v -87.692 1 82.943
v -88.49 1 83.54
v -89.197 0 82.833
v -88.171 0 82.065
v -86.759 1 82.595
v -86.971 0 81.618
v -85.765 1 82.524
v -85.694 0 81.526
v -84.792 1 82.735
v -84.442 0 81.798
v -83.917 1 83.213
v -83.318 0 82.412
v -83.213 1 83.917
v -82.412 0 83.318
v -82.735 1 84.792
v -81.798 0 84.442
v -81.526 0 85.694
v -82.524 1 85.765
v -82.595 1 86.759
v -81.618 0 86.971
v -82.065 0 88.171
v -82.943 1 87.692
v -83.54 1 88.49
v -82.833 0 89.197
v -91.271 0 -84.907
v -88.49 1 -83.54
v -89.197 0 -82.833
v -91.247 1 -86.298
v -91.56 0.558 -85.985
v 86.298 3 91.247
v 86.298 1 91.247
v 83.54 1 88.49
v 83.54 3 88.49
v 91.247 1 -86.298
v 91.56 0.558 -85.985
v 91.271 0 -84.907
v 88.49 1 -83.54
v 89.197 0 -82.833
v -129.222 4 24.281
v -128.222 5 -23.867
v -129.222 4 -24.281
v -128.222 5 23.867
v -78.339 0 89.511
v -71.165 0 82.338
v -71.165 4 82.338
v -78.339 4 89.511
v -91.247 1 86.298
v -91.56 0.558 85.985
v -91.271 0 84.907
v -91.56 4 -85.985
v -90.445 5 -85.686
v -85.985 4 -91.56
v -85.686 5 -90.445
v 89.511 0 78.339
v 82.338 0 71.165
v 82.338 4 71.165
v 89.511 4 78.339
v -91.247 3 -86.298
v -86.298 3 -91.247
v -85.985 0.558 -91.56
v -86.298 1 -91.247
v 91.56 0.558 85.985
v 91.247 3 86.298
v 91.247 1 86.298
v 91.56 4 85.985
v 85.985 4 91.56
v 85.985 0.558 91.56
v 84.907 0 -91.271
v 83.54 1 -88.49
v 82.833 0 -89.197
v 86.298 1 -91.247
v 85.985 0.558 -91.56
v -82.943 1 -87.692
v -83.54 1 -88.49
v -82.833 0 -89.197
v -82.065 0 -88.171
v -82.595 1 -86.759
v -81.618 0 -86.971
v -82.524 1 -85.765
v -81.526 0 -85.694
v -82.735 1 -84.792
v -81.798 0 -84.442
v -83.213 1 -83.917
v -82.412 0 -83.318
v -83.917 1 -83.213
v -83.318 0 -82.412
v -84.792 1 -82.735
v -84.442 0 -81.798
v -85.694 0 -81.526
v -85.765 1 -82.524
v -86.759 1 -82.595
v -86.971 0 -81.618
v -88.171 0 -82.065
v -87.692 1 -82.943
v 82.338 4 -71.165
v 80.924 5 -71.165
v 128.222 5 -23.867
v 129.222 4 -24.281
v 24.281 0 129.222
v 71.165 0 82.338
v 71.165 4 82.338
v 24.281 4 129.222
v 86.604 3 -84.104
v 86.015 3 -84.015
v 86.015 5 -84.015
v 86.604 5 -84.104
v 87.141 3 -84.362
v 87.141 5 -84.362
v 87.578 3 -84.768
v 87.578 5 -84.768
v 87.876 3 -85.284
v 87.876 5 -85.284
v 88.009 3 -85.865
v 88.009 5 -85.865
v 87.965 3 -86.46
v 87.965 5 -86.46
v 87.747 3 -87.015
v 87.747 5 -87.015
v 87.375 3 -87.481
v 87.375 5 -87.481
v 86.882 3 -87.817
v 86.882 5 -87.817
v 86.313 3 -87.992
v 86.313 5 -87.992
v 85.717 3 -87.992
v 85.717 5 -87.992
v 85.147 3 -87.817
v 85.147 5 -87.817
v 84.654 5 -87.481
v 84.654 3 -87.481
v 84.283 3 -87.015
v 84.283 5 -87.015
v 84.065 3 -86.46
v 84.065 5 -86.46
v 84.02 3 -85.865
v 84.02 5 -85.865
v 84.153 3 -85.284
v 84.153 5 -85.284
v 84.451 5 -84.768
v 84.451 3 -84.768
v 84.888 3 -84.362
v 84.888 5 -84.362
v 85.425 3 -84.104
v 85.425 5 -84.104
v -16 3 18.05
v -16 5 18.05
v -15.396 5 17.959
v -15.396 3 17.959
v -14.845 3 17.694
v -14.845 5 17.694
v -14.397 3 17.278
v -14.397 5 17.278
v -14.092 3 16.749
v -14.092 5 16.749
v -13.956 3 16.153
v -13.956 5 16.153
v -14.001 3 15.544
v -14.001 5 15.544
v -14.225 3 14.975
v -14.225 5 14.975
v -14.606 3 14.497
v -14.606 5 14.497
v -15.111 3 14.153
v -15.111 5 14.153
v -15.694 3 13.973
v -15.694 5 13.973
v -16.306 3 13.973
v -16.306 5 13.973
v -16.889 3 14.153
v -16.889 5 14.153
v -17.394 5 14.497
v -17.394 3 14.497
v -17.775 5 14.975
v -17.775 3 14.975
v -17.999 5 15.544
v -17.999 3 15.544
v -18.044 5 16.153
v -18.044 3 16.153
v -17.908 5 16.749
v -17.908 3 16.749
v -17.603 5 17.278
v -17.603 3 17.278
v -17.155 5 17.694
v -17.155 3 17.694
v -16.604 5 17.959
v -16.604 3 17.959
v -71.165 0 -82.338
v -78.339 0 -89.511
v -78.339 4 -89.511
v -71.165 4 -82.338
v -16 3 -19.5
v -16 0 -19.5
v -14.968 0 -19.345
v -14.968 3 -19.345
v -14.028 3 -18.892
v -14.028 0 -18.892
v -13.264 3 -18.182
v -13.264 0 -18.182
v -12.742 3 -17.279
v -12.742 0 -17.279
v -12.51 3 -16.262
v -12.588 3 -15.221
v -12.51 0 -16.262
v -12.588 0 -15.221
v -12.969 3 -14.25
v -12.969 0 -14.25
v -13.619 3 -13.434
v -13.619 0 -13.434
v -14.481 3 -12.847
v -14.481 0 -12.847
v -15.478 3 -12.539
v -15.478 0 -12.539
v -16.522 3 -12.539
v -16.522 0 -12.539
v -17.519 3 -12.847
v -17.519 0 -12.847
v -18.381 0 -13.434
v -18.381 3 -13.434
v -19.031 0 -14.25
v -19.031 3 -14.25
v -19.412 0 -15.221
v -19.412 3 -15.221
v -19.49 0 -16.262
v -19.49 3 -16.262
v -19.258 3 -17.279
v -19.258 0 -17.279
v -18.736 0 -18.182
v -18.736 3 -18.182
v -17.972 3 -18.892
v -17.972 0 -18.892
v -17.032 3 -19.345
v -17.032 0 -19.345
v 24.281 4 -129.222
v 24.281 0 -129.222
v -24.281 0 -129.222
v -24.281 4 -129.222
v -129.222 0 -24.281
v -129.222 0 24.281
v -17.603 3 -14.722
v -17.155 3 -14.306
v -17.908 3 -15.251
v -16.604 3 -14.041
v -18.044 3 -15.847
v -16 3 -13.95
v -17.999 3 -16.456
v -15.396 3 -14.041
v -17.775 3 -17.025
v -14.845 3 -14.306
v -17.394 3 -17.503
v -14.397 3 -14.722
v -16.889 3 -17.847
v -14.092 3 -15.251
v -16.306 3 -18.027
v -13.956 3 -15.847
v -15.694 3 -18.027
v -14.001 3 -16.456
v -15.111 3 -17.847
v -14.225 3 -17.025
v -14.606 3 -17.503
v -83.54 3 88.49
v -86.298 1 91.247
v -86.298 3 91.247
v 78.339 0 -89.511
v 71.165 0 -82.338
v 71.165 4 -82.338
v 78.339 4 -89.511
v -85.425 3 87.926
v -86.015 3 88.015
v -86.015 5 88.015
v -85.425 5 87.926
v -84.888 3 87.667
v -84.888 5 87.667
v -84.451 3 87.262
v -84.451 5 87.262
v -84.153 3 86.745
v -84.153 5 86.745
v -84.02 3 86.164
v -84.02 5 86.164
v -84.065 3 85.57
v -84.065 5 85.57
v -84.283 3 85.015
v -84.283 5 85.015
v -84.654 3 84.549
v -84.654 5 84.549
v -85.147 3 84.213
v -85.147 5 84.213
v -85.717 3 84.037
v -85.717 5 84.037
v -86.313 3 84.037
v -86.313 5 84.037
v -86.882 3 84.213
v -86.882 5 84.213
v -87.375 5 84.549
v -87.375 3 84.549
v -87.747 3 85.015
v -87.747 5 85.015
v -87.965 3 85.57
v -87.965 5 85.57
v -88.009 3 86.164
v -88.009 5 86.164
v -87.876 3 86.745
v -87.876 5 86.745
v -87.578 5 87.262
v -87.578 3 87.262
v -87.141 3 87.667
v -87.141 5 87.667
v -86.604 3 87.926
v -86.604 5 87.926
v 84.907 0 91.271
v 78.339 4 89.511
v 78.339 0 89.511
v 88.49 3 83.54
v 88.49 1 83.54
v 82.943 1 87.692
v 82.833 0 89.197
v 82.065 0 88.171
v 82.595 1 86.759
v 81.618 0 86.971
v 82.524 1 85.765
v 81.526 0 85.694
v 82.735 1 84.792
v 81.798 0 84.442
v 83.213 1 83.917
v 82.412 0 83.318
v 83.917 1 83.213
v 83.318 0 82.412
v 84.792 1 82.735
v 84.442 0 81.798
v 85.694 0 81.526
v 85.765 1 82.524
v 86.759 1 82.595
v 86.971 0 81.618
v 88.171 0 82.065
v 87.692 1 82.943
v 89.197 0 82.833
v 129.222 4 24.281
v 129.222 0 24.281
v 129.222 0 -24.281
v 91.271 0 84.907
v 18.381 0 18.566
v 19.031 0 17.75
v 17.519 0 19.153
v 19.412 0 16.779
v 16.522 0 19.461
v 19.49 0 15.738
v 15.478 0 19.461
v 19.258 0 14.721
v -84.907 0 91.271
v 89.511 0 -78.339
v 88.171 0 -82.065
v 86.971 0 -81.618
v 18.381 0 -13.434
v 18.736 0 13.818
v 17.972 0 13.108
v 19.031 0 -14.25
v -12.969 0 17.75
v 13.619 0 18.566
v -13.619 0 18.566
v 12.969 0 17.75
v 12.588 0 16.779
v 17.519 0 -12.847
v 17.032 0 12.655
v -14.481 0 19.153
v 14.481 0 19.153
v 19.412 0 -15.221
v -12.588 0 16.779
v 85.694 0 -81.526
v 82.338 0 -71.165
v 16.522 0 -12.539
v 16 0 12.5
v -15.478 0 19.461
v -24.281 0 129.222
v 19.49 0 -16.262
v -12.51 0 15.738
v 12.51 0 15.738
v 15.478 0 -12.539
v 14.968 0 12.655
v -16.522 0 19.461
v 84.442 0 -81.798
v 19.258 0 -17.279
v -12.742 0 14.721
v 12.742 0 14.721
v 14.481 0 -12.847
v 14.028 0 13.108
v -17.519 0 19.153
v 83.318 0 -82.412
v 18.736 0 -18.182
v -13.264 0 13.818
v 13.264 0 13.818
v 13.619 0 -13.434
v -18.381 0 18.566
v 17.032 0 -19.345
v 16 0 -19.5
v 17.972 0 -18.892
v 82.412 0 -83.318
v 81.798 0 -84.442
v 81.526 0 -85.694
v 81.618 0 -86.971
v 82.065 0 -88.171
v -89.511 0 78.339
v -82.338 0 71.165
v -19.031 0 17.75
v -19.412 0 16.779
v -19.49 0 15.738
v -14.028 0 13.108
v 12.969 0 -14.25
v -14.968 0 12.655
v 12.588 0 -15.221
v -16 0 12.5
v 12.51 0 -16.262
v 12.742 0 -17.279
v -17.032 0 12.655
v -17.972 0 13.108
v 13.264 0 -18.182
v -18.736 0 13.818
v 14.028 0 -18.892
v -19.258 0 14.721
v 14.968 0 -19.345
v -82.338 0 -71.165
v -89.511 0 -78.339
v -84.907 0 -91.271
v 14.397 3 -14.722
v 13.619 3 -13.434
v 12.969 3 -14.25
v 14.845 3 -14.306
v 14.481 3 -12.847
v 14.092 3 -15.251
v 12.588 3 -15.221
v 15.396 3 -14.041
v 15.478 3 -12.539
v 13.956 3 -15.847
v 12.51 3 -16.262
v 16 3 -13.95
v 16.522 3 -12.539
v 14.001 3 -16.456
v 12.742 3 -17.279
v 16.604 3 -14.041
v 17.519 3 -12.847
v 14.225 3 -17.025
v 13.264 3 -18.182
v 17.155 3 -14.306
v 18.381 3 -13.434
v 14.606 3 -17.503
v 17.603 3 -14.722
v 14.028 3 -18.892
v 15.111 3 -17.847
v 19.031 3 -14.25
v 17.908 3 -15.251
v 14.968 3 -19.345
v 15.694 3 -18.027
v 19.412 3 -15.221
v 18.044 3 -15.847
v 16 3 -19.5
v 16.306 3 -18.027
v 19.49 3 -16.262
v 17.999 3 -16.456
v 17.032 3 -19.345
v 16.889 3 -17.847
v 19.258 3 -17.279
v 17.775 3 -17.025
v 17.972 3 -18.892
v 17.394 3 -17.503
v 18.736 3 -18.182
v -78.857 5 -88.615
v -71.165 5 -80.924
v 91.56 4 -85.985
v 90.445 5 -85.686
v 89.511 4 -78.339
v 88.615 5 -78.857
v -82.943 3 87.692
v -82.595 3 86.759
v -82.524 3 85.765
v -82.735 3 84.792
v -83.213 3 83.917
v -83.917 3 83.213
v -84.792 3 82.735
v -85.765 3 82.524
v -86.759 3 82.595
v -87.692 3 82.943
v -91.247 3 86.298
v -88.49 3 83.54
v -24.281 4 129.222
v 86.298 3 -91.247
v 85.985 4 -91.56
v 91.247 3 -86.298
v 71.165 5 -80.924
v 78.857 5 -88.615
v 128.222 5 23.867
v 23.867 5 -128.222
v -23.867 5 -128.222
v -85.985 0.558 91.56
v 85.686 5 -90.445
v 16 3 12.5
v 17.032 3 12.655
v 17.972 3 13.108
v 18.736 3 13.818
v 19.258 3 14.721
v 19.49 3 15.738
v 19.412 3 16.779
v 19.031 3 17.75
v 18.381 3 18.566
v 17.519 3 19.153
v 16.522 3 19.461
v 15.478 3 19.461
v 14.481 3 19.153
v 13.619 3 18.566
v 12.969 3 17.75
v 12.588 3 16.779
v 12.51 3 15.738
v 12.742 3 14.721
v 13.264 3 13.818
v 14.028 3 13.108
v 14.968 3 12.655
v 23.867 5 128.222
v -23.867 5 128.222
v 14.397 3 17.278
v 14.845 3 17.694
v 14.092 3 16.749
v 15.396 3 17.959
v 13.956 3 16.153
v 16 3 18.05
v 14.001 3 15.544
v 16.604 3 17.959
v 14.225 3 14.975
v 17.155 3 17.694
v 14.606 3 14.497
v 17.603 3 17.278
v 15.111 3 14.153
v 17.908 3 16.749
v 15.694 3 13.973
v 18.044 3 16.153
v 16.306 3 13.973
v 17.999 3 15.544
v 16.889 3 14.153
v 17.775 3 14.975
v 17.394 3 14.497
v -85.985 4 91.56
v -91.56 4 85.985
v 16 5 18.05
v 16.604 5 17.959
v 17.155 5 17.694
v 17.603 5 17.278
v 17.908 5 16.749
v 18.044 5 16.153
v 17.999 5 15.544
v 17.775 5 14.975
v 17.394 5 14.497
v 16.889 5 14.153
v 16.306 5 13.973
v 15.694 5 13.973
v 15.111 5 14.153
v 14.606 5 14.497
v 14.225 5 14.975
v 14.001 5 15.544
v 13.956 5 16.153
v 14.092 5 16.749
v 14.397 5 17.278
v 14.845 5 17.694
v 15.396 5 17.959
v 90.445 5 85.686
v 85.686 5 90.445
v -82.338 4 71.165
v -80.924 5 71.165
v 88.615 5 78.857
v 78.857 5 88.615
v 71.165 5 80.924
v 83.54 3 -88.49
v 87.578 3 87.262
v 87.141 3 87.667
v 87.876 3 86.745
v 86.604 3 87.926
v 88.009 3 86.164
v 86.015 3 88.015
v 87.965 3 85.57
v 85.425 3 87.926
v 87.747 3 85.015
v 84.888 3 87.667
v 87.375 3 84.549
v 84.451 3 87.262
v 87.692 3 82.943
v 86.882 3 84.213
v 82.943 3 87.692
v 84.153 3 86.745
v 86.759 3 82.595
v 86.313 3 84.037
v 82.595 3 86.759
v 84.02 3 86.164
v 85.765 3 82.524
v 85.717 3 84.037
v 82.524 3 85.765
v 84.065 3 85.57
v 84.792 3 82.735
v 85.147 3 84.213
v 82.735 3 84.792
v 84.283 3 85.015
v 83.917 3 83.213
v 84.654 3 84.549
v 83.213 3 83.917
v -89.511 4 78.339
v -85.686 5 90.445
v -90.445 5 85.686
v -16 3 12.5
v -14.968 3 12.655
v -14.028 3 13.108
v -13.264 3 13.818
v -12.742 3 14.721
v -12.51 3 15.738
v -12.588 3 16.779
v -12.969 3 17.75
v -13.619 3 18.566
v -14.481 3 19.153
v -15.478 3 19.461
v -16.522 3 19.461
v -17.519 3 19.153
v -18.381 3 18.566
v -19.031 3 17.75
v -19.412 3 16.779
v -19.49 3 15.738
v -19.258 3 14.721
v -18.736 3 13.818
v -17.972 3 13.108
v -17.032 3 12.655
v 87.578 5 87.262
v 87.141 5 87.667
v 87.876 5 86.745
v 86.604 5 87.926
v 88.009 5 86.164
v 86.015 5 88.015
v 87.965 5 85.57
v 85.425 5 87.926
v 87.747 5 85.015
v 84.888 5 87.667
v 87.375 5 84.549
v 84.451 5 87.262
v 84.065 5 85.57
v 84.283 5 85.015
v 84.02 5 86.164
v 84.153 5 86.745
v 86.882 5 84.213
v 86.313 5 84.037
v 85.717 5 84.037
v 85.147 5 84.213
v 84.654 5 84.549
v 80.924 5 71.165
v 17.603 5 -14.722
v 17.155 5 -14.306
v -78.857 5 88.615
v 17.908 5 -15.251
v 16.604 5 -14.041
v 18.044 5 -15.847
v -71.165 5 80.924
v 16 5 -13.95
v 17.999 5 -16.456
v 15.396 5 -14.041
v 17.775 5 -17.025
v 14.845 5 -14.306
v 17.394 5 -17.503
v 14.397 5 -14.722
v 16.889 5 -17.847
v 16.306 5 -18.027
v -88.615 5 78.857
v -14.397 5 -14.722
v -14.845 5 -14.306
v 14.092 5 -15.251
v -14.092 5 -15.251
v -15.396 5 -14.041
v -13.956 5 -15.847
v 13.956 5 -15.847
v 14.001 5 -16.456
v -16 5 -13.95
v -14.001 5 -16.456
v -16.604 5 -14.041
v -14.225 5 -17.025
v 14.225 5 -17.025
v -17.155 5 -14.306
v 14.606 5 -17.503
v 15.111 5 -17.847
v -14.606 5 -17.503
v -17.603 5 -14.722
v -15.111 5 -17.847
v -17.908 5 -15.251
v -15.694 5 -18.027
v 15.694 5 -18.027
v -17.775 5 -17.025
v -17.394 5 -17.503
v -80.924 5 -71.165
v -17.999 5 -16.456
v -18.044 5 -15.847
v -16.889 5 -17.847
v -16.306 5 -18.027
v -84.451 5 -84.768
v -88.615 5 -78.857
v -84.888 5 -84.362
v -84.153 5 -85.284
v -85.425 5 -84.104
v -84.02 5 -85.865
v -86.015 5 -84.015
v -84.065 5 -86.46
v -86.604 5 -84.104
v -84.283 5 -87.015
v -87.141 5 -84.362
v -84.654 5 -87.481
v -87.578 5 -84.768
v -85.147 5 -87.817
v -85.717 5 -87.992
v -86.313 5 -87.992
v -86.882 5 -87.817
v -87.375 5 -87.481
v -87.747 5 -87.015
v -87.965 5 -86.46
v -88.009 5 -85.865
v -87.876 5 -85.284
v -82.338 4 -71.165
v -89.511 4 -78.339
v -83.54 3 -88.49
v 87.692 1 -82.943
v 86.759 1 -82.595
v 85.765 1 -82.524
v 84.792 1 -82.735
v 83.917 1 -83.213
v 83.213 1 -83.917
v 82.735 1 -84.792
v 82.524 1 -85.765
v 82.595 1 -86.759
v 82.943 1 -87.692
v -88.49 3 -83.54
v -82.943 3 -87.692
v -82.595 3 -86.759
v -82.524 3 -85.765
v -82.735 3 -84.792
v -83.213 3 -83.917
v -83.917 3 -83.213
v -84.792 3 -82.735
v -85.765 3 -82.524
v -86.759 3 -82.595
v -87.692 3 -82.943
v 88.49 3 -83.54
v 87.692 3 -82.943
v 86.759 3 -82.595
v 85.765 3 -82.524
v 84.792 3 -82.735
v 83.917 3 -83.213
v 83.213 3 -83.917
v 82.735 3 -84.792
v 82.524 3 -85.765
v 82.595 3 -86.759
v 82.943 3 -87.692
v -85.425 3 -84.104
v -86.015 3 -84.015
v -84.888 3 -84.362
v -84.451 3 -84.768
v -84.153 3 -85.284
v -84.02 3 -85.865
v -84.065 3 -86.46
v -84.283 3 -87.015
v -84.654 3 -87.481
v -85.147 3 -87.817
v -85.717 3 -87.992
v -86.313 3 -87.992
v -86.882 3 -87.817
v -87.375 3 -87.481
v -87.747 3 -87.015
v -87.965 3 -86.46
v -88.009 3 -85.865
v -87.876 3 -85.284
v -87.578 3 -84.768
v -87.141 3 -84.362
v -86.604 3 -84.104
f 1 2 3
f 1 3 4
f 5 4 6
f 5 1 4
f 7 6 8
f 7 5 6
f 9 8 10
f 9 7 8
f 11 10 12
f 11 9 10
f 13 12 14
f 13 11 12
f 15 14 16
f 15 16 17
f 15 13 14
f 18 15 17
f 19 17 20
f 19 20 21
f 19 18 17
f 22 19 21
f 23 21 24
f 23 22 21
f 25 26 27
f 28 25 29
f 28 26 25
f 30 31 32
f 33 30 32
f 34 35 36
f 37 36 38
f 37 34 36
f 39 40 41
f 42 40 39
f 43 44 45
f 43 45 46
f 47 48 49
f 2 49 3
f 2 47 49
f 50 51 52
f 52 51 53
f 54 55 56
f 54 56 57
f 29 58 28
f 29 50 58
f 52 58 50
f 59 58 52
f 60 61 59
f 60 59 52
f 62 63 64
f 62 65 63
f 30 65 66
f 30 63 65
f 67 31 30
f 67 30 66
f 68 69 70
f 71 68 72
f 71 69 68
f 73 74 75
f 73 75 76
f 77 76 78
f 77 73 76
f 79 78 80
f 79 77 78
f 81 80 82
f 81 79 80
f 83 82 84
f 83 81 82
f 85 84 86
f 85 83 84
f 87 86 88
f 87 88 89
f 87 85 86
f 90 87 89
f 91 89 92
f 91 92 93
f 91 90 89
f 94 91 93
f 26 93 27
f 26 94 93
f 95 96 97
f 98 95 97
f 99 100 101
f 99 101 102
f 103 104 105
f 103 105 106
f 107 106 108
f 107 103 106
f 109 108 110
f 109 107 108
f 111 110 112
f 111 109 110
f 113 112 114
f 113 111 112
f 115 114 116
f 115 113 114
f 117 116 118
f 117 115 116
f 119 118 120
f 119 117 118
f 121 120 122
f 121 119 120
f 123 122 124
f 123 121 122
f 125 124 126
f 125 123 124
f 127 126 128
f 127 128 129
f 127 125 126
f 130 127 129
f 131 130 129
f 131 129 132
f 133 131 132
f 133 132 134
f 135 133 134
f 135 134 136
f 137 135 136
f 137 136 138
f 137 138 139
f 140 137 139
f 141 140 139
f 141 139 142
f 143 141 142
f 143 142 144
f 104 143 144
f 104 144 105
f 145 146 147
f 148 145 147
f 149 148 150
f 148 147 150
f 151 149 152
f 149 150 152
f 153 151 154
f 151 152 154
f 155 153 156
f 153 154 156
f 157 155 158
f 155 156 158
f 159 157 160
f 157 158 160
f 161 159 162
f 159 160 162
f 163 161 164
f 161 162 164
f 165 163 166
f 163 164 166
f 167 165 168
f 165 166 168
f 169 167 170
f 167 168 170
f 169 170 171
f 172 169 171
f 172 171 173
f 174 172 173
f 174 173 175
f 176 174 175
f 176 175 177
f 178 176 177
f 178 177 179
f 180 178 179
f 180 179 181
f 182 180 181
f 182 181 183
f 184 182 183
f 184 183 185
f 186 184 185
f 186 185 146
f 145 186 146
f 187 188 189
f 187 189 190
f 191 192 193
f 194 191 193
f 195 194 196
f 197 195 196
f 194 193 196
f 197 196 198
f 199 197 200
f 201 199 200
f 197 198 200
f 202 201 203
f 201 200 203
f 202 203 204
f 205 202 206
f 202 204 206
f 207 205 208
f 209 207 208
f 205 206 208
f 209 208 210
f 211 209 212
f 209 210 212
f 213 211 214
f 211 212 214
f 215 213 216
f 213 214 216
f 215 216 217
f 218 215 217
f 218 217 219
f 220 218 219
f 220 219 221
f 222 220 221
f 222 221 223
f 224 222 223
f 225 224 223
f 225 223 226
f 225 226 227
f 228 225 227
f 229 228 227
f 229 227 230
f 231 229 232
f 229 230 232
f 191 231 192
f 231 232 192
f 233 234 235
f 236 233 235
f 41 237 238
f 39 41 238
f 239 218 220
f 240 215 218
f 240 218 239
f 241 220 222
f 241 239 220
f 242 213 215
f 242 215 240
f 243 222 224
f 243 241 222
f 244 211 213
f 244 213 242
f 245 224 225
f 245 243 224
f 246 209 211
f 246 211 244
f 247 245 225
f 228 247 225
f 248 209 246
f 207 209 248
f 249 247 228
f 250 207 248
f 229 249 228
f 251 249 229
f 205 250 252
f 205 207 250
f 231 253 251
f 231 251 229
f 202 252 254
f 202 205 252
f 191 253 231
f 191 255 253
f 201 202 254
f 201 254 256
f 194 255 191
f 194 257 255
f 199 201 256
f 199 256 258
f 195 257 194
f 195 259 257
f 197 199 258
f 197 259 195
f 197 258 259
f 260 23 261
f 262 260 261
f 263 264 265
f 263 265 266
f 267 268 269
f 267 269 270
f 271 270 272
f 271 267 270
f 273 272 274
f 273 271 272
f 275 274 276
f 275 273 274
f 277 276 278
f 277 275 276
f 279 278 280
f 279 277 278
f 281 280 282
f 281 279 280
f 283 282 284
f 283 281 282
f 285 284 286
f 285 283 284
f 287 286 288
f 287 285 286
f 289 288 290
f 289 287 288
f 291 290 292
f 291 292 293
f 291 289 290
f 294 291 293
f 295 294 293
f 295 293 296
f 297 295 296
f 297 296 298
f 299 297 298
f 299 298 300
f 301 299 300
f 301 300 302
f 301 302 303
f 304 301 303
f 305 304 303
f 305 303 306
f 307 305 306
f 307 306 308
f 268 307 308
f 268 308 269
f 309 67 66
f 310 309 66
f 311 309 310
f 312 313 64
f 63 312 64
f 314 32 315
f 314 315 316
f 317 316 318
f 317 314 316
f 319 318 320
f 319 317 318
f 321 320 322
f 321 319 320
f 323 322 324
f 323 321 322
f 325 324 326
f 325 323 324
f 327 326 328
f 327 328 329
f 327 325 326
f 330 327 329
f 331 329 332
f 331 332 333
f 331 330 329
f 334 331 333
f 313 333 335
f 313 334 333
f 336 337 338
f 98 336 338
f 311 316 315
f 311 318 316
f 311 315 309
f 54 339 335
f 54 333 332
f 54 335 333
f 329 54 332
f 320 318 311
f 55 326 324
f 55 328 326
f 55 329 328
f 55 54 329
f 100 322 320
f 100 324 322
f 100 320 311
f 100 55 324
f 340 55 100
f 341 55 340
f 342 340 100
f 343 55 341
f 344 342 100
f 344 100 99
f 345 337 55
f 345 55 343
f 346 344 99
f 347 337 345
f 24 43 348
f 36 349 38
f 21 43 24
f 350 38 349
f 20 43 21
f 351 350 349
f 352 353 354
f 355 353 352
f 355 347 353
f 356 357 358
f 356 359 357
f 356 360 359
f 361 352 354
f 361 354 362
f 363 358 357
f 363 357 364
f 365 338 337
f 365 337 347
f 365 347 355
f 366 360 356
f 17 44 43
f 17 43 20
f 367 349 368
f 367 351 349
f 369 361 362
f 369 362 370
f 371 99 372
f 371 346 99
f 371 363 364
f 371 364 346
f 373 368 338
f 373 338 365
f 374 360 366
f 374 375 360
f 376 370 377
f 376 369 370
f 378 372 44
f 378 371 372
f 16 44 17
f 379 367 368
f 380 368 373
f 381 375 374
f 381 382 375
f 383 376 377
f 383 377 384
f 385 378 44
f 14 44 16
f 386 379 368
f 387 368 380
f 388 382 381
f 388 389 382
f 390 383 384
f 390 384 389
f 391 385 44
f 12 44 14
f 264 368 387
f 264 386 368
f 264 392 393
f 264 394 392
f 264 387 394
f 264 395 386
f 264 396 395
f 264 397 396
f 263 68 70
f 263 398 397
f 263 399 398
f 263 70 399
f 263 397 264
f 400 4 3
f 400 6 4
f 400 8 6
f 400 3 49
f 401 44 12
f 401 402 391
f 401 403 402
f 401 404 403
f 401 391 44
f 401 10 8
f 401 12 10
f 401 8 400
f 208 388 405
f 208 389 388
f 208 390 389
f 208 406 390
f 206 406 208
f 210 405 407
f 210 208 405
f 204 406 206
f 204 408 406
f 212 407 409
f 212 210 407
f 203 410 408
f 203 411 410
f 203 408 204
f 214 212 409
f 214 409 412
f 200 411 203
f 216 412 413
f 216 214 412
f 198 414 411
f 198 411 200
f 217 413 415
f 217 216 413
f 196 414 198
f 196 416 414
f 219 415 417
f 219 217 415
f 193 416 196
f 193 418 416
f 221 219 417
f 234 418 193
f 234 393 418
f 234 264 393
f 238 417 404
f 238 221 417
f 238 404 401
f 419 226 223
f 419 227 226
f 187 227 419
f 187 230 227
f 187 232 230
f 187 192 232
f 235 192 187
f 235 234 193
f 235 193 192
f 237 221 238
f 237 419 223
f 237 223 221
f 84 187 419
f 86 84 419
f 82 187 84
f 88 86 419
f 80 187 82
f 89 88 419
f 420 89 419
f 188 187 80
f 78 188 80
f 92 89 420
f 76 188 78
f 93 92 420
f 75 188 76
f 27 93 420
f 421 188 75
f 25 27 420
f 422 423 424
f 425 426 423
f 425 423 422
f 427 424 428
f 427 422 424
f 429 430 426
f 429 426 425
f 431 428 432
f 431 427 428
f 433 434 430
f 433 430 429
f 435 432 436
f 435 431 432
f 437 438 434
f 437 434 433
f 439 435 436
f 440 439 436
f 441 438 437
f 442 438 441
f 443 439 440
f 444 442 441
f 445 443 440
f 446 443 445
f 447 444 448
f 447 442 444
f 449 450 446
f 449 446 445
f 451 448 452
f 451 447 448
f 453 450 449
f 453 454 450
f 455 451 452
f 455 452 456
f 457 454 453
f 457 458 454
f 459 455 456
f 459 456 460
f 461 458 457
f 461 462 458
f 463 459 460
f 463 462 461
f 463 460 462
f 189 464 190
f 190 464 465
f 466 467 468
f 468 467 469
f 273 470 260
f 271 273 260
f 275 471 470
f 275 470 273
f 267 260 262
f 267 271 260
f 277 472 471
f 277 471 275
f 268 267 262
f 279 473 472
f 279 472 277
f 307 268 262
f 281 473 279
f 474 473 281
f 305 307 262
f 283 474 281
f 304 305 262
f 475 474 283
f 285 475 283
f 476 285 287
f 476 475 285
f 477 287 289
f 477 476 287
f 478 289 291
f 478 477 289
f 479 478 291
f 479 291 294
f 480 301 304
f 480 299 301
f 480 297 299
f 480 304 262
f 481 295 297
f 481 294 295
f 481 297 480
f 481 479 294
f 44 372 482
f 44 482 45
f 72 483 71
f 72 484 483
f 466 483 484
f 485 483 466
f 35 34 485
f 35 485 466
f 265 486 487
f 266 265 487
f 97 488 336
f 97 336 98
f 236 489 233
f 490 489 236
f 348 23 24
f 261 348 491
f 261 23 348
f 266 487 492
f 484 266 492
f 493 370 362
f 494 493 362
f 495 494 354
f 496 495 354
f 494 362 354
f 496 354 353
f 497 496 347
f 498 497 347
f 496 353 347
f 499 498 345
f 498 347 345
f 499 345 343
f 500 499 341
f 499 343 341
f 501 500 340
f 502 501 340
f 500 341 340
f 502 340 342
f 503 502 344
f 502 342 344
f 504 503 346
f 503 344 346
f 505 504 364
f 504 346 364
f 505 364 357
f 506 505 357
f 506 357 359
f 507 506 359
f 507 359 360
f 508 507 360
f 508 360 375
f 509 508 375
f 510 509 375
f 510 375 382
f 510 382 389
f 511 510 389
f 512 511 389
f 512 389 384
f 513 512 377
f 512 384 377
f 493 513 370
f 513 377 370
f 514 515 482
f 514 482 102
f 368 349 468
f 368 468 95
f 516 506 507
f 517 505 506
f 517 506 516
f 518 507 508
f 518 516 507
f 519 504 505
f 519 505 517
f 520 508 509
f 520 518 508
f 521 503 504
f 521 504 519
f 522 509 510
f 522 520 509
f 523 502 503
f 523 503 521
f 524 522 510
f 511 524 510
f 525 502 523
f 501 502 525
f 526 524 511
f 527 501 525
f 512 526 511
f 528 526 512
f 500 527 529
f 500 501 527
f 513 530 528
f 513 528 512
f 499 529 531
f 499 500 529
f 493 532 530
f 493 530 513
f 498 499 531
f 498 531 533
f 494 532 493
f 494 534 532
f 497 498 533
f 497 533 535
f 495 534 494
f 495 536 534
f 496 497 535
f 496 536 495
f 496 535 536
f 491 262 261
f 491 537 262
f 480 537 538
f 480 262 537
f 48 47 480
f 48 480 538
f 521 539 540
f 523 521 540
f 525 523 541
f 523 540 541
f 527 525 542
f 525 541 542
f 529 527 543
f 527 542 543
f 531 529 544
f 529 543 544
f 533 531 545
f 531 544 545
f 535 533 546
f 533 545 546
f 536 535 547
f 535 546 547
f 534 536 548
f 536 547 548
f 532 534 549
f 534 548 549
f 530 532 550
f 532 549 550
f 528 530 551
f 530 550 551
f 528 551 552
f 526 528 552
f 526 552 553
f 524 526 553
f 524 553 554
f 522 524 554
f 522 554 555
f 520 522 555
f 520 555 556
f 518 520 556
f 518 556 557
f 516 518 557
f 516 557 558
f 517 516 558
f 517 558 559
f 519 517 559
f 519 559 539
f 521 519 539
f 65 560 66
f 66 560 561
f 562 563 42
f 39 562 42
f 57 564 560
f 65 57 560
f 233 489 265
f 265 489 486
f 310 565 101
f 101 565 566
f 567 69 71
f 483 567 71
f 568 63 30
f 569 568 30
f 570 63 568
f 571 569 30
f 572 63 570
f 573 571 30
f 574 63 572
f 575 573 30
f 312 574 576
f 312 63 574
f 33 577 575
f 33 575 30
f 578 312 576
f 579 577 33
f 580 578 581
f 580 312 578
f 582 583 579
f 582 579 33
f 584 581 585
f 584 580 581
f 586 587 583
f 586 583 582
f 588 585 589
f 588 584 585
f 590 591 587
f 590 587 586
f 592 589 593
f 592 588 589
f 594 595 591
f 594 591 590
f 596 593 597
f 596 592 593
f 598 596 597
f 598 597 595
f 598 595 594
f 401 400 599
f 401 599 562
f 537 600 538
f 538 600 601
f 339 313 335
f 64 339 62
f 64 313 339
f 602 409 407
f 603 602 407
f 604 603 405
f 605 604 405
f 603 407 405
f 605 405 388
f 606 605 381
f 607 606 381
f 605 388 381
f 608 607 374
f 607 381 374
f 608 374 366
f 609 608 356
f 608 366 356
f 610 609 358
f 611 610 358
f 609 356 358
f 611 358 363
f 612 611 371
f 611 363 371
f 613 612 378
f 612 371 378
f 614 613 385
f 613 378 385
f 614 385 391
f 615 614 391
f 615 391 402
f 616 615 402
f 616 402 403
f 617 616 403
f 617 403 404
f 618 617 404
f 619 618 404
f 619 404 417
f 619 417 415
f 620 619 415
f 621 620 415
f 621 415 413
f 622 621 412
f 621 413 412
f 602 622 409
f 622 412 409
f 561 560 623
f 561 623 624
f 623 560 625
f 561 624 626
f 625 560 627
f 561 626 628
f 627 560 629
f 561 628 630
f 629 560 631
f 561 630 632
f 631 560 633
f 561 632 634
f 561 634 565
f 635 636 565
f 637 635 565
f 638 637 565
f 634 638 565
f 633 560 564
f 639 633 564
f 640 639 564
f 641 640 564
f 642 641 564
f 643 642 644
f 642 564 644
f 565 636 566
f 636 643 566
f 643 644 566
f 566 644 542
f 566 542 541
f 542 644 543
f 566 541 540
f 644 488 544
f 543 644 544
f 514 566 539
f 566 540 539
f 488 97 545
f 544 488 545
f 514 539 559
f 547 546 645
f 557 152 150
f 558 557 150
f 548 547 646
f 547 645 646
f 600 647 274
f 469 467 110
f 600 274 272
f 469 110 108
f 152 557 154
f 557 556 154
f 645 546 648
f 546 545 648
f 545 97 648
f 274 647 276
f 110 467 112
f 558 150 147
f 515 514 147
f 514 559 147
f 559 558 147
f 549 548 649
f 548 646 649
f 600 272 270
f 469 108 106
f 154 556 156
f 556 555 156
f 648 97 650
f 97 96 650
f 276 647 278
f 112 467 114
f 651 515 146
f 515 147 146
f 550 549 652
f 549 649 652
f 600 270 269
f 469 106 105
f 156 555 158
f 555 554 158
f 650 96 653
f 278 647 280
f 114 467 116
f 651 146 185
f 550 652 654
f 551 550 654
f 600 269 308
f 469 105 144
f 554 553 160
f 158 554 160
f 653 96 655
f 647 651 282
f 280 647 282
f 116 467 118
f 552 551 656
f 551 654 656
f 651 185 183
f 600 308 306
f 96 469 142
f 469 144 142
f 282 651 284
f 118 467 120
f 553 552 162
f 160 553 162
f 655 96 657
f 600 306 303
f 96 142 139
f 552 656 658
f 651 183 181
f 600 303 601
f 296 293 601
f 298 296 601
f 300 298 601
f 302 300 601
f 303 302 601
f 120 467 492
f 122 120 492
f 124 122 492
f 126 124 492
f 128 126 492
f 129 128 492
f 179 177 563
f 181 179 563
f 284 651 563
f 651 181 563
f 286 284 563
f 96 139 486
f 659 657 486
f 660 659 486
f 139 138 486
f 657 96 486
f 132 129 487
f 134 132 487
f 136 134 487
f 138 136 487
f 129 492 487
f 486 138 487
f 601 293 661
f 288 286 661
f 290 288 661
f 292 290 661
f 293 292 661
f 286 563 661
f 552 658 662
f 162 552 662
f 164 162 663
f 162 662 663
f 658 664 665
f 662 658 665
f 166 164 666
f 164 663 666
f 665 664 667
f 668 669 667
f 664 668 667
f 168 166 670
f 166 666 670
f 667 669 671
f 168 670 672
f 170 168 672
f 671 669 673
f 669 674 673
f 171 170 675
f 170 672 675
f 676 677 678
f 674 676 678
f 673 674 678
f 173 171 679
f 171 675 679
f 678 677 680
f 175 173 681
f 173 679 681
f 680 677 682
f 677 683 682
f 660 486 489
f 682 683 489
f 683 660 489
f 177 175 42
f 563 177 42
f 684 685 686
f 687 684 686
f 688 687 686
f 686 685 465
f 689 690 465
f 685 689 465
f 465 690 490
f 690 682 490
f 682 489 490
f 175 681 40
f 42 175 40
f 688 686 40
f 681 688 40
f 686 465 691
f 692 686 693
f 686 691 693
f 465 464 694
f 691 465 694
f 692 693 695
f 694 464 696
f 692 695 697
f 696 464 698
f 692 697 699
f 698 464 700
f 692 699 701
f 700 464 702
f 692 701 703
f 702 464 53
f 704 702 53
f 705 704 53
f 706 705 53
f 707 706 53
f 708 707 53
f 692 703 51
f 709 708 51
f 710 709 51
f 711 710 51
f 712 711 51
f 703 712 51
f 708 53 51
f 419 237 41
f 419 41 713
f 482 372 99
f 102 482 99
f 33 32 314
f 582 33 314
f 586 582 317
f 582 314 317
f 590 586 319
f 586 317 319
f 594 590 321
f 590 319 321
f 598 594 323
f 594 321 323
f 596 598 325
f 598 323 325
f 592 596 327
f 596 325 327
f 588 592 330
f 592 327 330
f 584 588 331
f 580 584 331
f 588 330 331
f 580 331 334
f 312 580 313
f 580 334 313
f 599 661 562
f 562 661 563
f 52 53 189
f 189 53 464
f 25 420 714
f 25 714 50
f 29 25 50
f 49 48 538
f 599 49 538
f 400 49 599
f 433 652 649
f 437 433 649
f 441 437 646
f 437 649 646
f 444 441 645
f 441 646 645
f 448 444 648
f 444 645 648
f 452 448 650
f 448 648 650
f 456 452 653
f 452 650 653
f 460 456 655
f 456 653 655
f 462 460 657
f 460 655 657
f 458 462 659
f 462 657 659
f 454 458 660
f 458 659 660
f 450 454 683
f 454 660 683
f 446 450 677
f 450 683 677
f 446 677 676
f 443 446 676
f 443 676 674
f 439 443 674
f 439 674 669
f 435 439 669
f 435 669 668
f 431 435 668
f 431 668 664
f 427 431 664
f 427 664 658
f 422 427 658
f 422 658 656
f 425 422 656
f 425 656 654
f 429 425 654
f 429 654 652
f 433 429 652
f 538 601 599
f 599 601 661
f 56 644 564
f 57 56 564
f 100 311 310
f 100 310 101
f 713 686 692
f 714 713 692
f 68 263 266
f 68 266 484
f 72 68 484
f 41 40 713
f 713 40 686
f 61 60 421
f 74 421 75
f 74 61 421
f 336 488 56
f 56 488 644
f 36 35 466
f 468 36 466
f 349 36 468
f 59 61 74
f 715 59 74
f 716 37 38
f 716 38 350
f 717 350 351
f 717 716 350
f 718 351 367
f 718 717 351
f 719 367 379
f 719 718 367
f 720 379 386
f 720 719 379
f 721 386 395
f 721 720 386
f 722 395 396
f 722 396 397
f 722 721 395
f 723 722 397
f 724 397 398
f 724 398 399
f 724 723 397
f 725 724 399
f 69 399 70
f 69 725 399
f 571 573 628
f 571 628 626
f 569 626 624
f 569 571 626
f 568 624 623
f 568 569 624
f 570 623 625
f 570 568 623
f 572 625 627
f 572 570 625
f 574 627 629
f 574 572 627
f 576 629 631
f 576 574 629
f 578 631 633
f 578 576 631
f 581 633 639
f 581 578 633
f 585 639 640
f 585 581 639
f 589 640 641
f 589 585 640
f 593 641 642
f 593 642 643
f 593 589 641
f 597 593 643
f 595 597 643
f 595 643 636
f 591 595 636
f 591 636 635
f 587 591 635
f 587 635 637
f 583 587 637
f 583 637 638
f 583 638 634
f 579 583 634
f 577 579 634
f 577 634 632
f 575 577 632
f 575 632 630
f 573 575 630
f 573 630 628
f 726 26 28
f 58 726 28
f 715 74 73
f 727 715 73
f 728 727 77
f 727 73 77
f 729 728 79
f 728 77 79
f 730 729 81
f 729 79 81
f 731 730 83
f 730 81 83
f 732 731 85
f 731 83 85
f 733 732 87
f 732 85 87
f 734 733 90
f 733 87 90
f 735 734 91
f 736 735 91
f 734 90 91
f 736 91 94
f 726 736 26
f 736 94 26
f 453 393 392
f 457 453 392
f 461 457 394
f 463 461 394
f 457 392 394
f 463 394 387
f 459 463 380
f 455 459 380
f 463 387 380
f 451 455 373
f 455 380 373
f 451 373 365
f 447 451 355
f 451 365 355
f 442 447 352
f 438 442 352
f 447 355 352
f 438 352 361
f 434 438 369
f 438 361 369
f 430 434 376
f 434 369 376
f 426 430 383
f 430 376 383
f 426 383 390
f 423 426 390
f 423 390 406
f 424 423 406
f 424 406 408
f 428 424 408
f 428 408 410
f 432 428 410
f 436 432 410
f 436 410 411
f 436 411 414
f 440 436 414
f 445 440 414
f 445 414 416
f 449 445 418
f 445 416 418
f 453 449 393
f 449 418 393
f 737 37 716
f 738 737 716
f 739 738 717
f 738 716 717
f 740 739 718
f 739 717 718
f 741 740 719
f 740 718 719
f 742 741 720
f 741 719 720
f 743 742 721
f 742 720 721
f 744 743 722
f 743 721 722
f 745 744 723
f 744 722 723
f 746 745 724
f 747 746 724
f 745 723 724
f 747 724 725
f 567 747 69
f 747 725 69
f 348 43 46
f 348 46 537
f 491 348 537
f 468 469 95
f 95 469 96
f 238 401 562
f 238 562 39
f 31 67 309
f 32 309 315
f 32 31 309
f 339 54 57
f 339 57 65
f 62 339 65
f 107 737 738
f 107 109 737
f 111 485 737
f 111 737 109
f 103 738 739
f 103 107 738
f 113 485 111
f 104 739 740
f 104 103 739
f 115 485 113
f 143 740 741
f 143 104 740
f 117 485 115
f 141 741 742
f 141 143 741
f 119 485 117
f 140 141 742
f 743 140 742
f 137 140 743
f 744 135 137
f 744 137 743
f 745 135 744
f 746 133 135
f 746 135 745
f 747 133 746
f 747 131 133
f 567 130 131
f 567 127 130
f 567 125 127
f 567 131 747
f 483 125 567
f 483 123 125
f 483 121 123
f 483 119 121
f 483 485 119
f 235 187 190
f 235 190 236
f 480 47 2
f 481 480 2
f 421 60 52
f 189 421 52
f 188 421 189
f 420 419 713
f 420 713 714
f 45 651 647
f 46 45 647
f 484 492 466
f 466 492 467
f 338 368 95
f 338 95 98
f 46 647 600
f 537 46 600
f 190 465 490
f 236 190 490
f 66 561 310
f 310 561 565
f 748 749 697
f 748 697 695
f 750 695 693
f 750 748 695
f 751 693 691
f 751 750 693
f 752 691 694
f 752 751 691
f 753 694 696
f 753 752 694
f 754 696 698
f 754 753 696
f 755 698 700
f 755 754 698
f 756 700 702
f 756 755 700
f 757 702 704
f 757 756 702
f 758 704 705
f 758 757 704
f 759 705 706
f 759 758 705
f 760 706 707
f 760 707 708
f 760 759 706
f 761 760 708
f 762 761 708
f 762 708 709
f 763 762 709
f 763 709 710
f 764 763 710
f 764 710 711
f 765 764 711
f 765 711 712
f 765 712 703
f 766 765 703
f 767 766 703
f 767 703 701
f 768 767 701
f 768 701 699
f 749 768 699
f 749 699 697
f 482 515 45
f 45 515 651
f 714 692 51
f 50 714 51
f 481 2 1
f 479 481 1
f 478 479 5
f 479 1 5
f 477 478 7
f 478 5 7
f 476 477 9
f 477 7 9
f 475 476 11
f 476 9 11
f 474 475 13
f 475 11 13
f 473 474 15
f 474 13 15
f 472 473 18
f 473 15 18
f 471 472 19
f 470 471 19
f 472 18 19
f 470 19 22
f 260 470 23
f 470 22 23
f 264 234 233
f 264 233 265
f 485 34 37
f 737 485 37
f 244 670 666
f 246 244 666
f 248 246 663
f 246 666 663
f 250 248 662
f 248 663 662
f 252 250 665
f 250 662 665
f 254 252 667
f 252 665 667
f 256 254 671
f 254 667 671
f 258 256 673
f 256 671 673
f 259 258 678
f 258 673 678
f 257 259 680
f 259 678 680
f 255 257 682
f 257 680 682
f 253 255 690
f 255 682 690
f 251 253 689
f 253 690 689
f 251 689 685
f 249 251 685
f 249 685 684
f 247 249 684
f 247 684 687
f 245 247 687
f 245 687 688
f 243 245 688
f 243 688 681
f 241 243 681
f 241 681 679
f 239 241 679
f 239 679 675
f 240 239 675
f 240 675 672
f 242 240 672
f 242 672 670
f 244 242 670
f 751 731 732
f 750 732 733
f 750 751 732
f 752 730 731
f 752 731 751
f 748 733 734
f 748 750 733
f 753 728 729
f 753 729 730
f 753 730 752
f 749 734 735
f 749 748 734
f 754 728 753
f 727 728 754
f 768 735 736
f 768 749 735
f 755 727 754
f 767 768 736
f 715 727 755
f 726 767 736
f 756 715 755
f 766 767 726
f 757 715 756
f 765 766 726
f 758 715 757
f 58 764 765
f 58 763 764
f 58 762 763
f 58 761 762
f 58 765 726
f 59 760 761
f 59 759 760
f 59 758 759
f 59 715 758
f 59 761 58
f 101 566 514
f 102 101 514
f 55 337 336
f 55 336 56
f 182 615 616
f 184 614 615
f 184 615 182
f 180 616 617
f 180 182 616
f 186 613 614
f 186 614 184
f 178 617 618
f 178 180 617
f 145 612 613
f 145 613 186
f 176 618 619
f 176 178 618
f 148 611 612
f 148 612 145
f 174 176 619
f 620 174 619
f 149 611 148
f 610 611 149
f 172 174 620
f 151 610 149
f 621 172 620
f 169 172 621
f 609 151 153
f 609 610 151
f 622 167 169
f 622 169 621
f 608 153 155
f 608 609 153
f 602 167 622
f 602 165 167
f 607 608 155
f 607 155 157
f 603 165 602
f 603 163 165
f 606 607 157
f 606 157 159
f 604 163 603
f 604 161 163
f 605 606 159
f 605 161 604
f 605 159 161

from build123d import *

# Parameters (mm, degrees)
SKETCH2_R                                  = 2
SKETCH2_R_2                                = 1.999999996
MAIN_FLOOR_EXTRUDE_DEPTH                   = 5
MAIN_FLOOR_CHAMFER_SIZE                    = 1
MOUNT_SCREW_COUNTERSINK_DEPTH              = 3
MOUNT_SCREW_COUNTERSINK_CHAMFER_SIZE       = 1
SKETCH6_R                                  = 2.05
BOTTOM_MOTOR_MOUNT_HOLES_DEPTH             = 183.816359737
SKETCH7_R                                  = 3.5
BOTTOM_MOTOR_MOUNT_HOLES_COUNTERSINK_DEPTH = 3


with BuildPart() as part:
    # Sketch2 → Main Floor Extrude (new body)
    with BuildSketch(Plane(origin=(0, 0, 0), x_dir=(1, 0, 0), z_dir=(0, 1, 0))):
        Polygon((129.222330464, 0), (129.222330464, -24.28090912), (82.337763357, -71.165476227), (89.511362957, -78.339075827), (91.560037368, -85.984832777), (85.984832777, -91.560037368), (78.339075822, -89.511362977), (71.165476214, -82.33776337), (24.280909108, -129.222330477), (0, -129.222330477), (-24.28090912, -129.222330477), (-71.165476227, -82.33776337), (-78.339075827, -89.51136297), (-85.984832777, -91.560037381), (-91.560037368, -85.984832789), (-89.511362977, -78.339075834), (-82.33776337, -71.165476227), (-129.222330477, -24.28090912), (-129.222330477, -1.3e-08), (-129.222330477, 24.280909108), (-82.33776337, 71.165476214), (-89.51136297, 78.339075814), (-91.560037381, 85.984832764), (-85.984832789, 91.560037355), (-78.339075834, 89.511362964), (-71.165476227, 82.337763357), (-24.28090912, 129.222330464), (-1.3e-08, 129.222330464), (24.280909108, 129.222330464), (71.165476214, 82.337763357), (78.339075814, 89.511362957), (85.984832764, 91.560037368), (91.560037355, 85.984832777), (89.511362964, 78.339075822), (82.337763357, 71.165476214), (129.222330464, 24.280909108), align=None)
        with Locations(Location((86.014718626, -86.014718626, 0), (0, 0, 270))):
            Circle(SKETCH2_R, mode=Mode.SUBTRACT)
        with Locations(Location((-86.014718626, -86.014718639, 0), (0, 0, 270))):
            Circle(SKETCH2_R, mode=Mode.SUBTRACT)
        with Locations(Location((-86.014718639, 86.014718613, 0), (0, 0, 270))):
            Circle(SKETCH2_R, mode=Mode.SUBTRACT)
        with Locations(Location((86.014718613, 86.014718626, 0), (0, 0, 270))):
            Circle(SKETCH2_R_2, mode=Mode.SUBTRACT)
    extrude(amount=MAIN_FLOOR_EXTRUDE_DEPTH)

    # Main Floor Chamfer
    main_floor_chamfer_edges = [part.edges().sort_by_distance(p)[0] for p in [
        (-74.752276027, 5, 85.92456317),
        (-47.723192674, 5, 105.780046923),
        (-6e-09, 5, 129.222330477),
        (47.723192661, 5, 105.780046923),
        (74.752276018, 5, 85.924563174),
        (82.161954299, 5, 90.535700173),
        (88.772435072, 5, 88.772435072),
        (85.924563161, 5, -74.752276018),
        (90.535700163, 5, 82.161954302),
        (85.924563157, 5, 74.752276027),
        (105.780046911, 5, 47.723192674),
        (90.53570016, 5, -82.161954299),
        (88.77243506, 5, -88.772435072),
        (82.161954289, 5, -90.535700163),
        (74.752276014, 5, -85.924563157),
        (47.723192661, 5, -105.780046911),
        (-6e-09, 5, -129.222330464),
        (-47.723192674, 5, -105.780046911),
        (-74.752276031, 5, -85.924563161),
        (129.222330464, 5, 6e-09),
        (-82.161954312, 5, -90.53570016),
        (-88.772435085, 5, -88.77243506),
        (-90.535700175, 5, -82.161954289),
        (-85.92456317, 5, -74.752276014),
        (-105.780046923, 5, -47.723192661),
        (-129.222330477, 5, 6e-09),
        (-105.780046923, 5, 47.723192674),
        (-85.924563174, 5, 74.752276031),
        (-90.535700173, 5, 82.161954312),
        (105.780046911, 5, -47.723192661),
        (-88.772435072, 5, 88.772435085),
        (-82.161954302, 5, 90.535700175),
    ]]
    chamfer(main_floor_chamfer_edges, length=MAIN_FLOOR_CHAMFER_SIZE)

    # Sketch3 → Mount Screw Countersink (cut)
    with BuildSketch(Plane(origin=(0, 0, 0), x_dir=(-1, 0, 0), z_dir=(0, -1, 0))):
        with BuildLine():
            Line((91.247308807, -86.297561351), (88.48959236, -83.539844904))
            ThreePointArc((88.48959236, -83.539844904), (83.539844892, -83.539844904), (83.539844892, -88.489592373))
            Line((83.539844892, -88.489592373), (86.297561338, -91.247308819))
            Line((86.297561338, -91.247308819), (91.247308807, -86.297561351))
        make_face()
        with BuildLine():
            Line((-86.297561351, -91.247308807), (-83.539844904, -88.48959236))
            ThreePointArc((-83.539844904, -88.48959236), (-83.539844904, -83.539844892), (-88.489592373, -83.539844892))
            Line((-88.489592373, -83.539844892), (-91.247308819, -86.297561338))
            Line((-91.247308819, -86.297561338), (-86.297561351, -91.247308807))
        make_face()
        with BuildLine():
            Line((-91.247308807, 86.297561351), (-88.48959236, 83.539844904))
            ThreePointArc((-88.48959236, 83.539844904), (-83.539844892, 83.539844904), (-83.539844892, 88.489592373))
            Line((-83.539844892, 88.489592373), (-86.297561338, 91.247308819))
            Line((-86.297561338, 91.247308819), (-91.247308807, 86.297561351))
        make_face()
        with BuildLine():
            Line((86.297561351, 91.247308807), (83.539844904, 88.48959236))
            ThreePointArc((83.539844904, 88.48959236), (83.539844904, 83.539844892), (88.489592373, 83.539844892))
            Line((88.489592373, 83.539844892), (91.247308819, 86.297561338))
            Line((91.247308819, 86.297561338), (86.297561351, 91.247308807))
        make_face()
    extrude(amount=-MOUNT_SCREW_COUNTERSINK_DEPTH, mode=Mode.SUBTRACT)

    # Mount Screw Countersink Chamfer
    mount_screw_countersink_chamfer_edges = [part.edges().sort_by_distance(p)[0] for p in [
        (-84.918703128, 0, -89.868450583),
        (-89.868450596, 0, -84.918703115),
        (-83.539844904, 0, -83.539844892),
        (89.868450583, 0, -84.918703128),
        (84.918703115, 0, -89.868450596),
        (83.539844892, 0, -83.539844904),
        (84.918703128, 0, 89.868450583),
        (89.868450596, 0, 84.918703115),
        (83.539844904, 0, 83.539844892),
        (-89.868450583, 0, 84.918703128),
        (-84.918703115, 0, 89.868450596),
        (-83.539844892, 0, 83.539844904),
    ]]
    chamfer(mount_screw_countersink_chamfer_edges, length=MOUNT_SCREW_COUNTERSINK_CHAMFER_SIZE)

    # Sketch6 → Bottom Motor Mount Holes (cut, through all)
    with BuildSketch(Plane(origin=(0, 5, 0), x_dir=(1, 0, 0), z_dir=(0, 1, 0))):
        with Locations(Location((-16, 16, 0), (0, 0, 270))):
            Circle(SKETCH6_R)
        with Locations(Location((16, 16, 0), (0, 0, 270))):
            Circle(SKETCH6_R)
        with Locations(Location((16, -16, 0), (0, 0, 270))):
            Circle(SKETCH6_R)
        with Locations(Location((-16, -16, 0), (0, 0, 270))):
            Circle(SKETCH6_R)
    extrude(amount=-BOTTOM_MOTOR_MOUNT_HOLES_DEPTH, mode=Mode.SUBTRACT)

    # Sketch7 → Bottom Motor Mount Holes Countersink (cut)
    with BuildSketch(Plane(origin=(0, 0, 0), x_dir=(-1, 0, 0), z_dir=(0, -1, 0))):
        with Locations(Location((16, -16, 0), (0, 0, 90))):
            Circle(SKETCH7_R)
        with Locations(Location((-16, -16, 0), (0, 0, 90))):
            Circle(SKETCH7_R)
        with Locations(Location((-16, 16, 0), (0, 0, 90))):
            Circle(SKETCH7_R)
        with Locations(Location((16, 16, 0), (0, 0, 90))):
            Circle(SKETCH7_R)
    extrude(amount=-BOTTOM_MOTOR_MOUNT_HOLES_COUNTERSINK_DEPTH, mode=Mode.SUBTRACT)


solid = part.part
